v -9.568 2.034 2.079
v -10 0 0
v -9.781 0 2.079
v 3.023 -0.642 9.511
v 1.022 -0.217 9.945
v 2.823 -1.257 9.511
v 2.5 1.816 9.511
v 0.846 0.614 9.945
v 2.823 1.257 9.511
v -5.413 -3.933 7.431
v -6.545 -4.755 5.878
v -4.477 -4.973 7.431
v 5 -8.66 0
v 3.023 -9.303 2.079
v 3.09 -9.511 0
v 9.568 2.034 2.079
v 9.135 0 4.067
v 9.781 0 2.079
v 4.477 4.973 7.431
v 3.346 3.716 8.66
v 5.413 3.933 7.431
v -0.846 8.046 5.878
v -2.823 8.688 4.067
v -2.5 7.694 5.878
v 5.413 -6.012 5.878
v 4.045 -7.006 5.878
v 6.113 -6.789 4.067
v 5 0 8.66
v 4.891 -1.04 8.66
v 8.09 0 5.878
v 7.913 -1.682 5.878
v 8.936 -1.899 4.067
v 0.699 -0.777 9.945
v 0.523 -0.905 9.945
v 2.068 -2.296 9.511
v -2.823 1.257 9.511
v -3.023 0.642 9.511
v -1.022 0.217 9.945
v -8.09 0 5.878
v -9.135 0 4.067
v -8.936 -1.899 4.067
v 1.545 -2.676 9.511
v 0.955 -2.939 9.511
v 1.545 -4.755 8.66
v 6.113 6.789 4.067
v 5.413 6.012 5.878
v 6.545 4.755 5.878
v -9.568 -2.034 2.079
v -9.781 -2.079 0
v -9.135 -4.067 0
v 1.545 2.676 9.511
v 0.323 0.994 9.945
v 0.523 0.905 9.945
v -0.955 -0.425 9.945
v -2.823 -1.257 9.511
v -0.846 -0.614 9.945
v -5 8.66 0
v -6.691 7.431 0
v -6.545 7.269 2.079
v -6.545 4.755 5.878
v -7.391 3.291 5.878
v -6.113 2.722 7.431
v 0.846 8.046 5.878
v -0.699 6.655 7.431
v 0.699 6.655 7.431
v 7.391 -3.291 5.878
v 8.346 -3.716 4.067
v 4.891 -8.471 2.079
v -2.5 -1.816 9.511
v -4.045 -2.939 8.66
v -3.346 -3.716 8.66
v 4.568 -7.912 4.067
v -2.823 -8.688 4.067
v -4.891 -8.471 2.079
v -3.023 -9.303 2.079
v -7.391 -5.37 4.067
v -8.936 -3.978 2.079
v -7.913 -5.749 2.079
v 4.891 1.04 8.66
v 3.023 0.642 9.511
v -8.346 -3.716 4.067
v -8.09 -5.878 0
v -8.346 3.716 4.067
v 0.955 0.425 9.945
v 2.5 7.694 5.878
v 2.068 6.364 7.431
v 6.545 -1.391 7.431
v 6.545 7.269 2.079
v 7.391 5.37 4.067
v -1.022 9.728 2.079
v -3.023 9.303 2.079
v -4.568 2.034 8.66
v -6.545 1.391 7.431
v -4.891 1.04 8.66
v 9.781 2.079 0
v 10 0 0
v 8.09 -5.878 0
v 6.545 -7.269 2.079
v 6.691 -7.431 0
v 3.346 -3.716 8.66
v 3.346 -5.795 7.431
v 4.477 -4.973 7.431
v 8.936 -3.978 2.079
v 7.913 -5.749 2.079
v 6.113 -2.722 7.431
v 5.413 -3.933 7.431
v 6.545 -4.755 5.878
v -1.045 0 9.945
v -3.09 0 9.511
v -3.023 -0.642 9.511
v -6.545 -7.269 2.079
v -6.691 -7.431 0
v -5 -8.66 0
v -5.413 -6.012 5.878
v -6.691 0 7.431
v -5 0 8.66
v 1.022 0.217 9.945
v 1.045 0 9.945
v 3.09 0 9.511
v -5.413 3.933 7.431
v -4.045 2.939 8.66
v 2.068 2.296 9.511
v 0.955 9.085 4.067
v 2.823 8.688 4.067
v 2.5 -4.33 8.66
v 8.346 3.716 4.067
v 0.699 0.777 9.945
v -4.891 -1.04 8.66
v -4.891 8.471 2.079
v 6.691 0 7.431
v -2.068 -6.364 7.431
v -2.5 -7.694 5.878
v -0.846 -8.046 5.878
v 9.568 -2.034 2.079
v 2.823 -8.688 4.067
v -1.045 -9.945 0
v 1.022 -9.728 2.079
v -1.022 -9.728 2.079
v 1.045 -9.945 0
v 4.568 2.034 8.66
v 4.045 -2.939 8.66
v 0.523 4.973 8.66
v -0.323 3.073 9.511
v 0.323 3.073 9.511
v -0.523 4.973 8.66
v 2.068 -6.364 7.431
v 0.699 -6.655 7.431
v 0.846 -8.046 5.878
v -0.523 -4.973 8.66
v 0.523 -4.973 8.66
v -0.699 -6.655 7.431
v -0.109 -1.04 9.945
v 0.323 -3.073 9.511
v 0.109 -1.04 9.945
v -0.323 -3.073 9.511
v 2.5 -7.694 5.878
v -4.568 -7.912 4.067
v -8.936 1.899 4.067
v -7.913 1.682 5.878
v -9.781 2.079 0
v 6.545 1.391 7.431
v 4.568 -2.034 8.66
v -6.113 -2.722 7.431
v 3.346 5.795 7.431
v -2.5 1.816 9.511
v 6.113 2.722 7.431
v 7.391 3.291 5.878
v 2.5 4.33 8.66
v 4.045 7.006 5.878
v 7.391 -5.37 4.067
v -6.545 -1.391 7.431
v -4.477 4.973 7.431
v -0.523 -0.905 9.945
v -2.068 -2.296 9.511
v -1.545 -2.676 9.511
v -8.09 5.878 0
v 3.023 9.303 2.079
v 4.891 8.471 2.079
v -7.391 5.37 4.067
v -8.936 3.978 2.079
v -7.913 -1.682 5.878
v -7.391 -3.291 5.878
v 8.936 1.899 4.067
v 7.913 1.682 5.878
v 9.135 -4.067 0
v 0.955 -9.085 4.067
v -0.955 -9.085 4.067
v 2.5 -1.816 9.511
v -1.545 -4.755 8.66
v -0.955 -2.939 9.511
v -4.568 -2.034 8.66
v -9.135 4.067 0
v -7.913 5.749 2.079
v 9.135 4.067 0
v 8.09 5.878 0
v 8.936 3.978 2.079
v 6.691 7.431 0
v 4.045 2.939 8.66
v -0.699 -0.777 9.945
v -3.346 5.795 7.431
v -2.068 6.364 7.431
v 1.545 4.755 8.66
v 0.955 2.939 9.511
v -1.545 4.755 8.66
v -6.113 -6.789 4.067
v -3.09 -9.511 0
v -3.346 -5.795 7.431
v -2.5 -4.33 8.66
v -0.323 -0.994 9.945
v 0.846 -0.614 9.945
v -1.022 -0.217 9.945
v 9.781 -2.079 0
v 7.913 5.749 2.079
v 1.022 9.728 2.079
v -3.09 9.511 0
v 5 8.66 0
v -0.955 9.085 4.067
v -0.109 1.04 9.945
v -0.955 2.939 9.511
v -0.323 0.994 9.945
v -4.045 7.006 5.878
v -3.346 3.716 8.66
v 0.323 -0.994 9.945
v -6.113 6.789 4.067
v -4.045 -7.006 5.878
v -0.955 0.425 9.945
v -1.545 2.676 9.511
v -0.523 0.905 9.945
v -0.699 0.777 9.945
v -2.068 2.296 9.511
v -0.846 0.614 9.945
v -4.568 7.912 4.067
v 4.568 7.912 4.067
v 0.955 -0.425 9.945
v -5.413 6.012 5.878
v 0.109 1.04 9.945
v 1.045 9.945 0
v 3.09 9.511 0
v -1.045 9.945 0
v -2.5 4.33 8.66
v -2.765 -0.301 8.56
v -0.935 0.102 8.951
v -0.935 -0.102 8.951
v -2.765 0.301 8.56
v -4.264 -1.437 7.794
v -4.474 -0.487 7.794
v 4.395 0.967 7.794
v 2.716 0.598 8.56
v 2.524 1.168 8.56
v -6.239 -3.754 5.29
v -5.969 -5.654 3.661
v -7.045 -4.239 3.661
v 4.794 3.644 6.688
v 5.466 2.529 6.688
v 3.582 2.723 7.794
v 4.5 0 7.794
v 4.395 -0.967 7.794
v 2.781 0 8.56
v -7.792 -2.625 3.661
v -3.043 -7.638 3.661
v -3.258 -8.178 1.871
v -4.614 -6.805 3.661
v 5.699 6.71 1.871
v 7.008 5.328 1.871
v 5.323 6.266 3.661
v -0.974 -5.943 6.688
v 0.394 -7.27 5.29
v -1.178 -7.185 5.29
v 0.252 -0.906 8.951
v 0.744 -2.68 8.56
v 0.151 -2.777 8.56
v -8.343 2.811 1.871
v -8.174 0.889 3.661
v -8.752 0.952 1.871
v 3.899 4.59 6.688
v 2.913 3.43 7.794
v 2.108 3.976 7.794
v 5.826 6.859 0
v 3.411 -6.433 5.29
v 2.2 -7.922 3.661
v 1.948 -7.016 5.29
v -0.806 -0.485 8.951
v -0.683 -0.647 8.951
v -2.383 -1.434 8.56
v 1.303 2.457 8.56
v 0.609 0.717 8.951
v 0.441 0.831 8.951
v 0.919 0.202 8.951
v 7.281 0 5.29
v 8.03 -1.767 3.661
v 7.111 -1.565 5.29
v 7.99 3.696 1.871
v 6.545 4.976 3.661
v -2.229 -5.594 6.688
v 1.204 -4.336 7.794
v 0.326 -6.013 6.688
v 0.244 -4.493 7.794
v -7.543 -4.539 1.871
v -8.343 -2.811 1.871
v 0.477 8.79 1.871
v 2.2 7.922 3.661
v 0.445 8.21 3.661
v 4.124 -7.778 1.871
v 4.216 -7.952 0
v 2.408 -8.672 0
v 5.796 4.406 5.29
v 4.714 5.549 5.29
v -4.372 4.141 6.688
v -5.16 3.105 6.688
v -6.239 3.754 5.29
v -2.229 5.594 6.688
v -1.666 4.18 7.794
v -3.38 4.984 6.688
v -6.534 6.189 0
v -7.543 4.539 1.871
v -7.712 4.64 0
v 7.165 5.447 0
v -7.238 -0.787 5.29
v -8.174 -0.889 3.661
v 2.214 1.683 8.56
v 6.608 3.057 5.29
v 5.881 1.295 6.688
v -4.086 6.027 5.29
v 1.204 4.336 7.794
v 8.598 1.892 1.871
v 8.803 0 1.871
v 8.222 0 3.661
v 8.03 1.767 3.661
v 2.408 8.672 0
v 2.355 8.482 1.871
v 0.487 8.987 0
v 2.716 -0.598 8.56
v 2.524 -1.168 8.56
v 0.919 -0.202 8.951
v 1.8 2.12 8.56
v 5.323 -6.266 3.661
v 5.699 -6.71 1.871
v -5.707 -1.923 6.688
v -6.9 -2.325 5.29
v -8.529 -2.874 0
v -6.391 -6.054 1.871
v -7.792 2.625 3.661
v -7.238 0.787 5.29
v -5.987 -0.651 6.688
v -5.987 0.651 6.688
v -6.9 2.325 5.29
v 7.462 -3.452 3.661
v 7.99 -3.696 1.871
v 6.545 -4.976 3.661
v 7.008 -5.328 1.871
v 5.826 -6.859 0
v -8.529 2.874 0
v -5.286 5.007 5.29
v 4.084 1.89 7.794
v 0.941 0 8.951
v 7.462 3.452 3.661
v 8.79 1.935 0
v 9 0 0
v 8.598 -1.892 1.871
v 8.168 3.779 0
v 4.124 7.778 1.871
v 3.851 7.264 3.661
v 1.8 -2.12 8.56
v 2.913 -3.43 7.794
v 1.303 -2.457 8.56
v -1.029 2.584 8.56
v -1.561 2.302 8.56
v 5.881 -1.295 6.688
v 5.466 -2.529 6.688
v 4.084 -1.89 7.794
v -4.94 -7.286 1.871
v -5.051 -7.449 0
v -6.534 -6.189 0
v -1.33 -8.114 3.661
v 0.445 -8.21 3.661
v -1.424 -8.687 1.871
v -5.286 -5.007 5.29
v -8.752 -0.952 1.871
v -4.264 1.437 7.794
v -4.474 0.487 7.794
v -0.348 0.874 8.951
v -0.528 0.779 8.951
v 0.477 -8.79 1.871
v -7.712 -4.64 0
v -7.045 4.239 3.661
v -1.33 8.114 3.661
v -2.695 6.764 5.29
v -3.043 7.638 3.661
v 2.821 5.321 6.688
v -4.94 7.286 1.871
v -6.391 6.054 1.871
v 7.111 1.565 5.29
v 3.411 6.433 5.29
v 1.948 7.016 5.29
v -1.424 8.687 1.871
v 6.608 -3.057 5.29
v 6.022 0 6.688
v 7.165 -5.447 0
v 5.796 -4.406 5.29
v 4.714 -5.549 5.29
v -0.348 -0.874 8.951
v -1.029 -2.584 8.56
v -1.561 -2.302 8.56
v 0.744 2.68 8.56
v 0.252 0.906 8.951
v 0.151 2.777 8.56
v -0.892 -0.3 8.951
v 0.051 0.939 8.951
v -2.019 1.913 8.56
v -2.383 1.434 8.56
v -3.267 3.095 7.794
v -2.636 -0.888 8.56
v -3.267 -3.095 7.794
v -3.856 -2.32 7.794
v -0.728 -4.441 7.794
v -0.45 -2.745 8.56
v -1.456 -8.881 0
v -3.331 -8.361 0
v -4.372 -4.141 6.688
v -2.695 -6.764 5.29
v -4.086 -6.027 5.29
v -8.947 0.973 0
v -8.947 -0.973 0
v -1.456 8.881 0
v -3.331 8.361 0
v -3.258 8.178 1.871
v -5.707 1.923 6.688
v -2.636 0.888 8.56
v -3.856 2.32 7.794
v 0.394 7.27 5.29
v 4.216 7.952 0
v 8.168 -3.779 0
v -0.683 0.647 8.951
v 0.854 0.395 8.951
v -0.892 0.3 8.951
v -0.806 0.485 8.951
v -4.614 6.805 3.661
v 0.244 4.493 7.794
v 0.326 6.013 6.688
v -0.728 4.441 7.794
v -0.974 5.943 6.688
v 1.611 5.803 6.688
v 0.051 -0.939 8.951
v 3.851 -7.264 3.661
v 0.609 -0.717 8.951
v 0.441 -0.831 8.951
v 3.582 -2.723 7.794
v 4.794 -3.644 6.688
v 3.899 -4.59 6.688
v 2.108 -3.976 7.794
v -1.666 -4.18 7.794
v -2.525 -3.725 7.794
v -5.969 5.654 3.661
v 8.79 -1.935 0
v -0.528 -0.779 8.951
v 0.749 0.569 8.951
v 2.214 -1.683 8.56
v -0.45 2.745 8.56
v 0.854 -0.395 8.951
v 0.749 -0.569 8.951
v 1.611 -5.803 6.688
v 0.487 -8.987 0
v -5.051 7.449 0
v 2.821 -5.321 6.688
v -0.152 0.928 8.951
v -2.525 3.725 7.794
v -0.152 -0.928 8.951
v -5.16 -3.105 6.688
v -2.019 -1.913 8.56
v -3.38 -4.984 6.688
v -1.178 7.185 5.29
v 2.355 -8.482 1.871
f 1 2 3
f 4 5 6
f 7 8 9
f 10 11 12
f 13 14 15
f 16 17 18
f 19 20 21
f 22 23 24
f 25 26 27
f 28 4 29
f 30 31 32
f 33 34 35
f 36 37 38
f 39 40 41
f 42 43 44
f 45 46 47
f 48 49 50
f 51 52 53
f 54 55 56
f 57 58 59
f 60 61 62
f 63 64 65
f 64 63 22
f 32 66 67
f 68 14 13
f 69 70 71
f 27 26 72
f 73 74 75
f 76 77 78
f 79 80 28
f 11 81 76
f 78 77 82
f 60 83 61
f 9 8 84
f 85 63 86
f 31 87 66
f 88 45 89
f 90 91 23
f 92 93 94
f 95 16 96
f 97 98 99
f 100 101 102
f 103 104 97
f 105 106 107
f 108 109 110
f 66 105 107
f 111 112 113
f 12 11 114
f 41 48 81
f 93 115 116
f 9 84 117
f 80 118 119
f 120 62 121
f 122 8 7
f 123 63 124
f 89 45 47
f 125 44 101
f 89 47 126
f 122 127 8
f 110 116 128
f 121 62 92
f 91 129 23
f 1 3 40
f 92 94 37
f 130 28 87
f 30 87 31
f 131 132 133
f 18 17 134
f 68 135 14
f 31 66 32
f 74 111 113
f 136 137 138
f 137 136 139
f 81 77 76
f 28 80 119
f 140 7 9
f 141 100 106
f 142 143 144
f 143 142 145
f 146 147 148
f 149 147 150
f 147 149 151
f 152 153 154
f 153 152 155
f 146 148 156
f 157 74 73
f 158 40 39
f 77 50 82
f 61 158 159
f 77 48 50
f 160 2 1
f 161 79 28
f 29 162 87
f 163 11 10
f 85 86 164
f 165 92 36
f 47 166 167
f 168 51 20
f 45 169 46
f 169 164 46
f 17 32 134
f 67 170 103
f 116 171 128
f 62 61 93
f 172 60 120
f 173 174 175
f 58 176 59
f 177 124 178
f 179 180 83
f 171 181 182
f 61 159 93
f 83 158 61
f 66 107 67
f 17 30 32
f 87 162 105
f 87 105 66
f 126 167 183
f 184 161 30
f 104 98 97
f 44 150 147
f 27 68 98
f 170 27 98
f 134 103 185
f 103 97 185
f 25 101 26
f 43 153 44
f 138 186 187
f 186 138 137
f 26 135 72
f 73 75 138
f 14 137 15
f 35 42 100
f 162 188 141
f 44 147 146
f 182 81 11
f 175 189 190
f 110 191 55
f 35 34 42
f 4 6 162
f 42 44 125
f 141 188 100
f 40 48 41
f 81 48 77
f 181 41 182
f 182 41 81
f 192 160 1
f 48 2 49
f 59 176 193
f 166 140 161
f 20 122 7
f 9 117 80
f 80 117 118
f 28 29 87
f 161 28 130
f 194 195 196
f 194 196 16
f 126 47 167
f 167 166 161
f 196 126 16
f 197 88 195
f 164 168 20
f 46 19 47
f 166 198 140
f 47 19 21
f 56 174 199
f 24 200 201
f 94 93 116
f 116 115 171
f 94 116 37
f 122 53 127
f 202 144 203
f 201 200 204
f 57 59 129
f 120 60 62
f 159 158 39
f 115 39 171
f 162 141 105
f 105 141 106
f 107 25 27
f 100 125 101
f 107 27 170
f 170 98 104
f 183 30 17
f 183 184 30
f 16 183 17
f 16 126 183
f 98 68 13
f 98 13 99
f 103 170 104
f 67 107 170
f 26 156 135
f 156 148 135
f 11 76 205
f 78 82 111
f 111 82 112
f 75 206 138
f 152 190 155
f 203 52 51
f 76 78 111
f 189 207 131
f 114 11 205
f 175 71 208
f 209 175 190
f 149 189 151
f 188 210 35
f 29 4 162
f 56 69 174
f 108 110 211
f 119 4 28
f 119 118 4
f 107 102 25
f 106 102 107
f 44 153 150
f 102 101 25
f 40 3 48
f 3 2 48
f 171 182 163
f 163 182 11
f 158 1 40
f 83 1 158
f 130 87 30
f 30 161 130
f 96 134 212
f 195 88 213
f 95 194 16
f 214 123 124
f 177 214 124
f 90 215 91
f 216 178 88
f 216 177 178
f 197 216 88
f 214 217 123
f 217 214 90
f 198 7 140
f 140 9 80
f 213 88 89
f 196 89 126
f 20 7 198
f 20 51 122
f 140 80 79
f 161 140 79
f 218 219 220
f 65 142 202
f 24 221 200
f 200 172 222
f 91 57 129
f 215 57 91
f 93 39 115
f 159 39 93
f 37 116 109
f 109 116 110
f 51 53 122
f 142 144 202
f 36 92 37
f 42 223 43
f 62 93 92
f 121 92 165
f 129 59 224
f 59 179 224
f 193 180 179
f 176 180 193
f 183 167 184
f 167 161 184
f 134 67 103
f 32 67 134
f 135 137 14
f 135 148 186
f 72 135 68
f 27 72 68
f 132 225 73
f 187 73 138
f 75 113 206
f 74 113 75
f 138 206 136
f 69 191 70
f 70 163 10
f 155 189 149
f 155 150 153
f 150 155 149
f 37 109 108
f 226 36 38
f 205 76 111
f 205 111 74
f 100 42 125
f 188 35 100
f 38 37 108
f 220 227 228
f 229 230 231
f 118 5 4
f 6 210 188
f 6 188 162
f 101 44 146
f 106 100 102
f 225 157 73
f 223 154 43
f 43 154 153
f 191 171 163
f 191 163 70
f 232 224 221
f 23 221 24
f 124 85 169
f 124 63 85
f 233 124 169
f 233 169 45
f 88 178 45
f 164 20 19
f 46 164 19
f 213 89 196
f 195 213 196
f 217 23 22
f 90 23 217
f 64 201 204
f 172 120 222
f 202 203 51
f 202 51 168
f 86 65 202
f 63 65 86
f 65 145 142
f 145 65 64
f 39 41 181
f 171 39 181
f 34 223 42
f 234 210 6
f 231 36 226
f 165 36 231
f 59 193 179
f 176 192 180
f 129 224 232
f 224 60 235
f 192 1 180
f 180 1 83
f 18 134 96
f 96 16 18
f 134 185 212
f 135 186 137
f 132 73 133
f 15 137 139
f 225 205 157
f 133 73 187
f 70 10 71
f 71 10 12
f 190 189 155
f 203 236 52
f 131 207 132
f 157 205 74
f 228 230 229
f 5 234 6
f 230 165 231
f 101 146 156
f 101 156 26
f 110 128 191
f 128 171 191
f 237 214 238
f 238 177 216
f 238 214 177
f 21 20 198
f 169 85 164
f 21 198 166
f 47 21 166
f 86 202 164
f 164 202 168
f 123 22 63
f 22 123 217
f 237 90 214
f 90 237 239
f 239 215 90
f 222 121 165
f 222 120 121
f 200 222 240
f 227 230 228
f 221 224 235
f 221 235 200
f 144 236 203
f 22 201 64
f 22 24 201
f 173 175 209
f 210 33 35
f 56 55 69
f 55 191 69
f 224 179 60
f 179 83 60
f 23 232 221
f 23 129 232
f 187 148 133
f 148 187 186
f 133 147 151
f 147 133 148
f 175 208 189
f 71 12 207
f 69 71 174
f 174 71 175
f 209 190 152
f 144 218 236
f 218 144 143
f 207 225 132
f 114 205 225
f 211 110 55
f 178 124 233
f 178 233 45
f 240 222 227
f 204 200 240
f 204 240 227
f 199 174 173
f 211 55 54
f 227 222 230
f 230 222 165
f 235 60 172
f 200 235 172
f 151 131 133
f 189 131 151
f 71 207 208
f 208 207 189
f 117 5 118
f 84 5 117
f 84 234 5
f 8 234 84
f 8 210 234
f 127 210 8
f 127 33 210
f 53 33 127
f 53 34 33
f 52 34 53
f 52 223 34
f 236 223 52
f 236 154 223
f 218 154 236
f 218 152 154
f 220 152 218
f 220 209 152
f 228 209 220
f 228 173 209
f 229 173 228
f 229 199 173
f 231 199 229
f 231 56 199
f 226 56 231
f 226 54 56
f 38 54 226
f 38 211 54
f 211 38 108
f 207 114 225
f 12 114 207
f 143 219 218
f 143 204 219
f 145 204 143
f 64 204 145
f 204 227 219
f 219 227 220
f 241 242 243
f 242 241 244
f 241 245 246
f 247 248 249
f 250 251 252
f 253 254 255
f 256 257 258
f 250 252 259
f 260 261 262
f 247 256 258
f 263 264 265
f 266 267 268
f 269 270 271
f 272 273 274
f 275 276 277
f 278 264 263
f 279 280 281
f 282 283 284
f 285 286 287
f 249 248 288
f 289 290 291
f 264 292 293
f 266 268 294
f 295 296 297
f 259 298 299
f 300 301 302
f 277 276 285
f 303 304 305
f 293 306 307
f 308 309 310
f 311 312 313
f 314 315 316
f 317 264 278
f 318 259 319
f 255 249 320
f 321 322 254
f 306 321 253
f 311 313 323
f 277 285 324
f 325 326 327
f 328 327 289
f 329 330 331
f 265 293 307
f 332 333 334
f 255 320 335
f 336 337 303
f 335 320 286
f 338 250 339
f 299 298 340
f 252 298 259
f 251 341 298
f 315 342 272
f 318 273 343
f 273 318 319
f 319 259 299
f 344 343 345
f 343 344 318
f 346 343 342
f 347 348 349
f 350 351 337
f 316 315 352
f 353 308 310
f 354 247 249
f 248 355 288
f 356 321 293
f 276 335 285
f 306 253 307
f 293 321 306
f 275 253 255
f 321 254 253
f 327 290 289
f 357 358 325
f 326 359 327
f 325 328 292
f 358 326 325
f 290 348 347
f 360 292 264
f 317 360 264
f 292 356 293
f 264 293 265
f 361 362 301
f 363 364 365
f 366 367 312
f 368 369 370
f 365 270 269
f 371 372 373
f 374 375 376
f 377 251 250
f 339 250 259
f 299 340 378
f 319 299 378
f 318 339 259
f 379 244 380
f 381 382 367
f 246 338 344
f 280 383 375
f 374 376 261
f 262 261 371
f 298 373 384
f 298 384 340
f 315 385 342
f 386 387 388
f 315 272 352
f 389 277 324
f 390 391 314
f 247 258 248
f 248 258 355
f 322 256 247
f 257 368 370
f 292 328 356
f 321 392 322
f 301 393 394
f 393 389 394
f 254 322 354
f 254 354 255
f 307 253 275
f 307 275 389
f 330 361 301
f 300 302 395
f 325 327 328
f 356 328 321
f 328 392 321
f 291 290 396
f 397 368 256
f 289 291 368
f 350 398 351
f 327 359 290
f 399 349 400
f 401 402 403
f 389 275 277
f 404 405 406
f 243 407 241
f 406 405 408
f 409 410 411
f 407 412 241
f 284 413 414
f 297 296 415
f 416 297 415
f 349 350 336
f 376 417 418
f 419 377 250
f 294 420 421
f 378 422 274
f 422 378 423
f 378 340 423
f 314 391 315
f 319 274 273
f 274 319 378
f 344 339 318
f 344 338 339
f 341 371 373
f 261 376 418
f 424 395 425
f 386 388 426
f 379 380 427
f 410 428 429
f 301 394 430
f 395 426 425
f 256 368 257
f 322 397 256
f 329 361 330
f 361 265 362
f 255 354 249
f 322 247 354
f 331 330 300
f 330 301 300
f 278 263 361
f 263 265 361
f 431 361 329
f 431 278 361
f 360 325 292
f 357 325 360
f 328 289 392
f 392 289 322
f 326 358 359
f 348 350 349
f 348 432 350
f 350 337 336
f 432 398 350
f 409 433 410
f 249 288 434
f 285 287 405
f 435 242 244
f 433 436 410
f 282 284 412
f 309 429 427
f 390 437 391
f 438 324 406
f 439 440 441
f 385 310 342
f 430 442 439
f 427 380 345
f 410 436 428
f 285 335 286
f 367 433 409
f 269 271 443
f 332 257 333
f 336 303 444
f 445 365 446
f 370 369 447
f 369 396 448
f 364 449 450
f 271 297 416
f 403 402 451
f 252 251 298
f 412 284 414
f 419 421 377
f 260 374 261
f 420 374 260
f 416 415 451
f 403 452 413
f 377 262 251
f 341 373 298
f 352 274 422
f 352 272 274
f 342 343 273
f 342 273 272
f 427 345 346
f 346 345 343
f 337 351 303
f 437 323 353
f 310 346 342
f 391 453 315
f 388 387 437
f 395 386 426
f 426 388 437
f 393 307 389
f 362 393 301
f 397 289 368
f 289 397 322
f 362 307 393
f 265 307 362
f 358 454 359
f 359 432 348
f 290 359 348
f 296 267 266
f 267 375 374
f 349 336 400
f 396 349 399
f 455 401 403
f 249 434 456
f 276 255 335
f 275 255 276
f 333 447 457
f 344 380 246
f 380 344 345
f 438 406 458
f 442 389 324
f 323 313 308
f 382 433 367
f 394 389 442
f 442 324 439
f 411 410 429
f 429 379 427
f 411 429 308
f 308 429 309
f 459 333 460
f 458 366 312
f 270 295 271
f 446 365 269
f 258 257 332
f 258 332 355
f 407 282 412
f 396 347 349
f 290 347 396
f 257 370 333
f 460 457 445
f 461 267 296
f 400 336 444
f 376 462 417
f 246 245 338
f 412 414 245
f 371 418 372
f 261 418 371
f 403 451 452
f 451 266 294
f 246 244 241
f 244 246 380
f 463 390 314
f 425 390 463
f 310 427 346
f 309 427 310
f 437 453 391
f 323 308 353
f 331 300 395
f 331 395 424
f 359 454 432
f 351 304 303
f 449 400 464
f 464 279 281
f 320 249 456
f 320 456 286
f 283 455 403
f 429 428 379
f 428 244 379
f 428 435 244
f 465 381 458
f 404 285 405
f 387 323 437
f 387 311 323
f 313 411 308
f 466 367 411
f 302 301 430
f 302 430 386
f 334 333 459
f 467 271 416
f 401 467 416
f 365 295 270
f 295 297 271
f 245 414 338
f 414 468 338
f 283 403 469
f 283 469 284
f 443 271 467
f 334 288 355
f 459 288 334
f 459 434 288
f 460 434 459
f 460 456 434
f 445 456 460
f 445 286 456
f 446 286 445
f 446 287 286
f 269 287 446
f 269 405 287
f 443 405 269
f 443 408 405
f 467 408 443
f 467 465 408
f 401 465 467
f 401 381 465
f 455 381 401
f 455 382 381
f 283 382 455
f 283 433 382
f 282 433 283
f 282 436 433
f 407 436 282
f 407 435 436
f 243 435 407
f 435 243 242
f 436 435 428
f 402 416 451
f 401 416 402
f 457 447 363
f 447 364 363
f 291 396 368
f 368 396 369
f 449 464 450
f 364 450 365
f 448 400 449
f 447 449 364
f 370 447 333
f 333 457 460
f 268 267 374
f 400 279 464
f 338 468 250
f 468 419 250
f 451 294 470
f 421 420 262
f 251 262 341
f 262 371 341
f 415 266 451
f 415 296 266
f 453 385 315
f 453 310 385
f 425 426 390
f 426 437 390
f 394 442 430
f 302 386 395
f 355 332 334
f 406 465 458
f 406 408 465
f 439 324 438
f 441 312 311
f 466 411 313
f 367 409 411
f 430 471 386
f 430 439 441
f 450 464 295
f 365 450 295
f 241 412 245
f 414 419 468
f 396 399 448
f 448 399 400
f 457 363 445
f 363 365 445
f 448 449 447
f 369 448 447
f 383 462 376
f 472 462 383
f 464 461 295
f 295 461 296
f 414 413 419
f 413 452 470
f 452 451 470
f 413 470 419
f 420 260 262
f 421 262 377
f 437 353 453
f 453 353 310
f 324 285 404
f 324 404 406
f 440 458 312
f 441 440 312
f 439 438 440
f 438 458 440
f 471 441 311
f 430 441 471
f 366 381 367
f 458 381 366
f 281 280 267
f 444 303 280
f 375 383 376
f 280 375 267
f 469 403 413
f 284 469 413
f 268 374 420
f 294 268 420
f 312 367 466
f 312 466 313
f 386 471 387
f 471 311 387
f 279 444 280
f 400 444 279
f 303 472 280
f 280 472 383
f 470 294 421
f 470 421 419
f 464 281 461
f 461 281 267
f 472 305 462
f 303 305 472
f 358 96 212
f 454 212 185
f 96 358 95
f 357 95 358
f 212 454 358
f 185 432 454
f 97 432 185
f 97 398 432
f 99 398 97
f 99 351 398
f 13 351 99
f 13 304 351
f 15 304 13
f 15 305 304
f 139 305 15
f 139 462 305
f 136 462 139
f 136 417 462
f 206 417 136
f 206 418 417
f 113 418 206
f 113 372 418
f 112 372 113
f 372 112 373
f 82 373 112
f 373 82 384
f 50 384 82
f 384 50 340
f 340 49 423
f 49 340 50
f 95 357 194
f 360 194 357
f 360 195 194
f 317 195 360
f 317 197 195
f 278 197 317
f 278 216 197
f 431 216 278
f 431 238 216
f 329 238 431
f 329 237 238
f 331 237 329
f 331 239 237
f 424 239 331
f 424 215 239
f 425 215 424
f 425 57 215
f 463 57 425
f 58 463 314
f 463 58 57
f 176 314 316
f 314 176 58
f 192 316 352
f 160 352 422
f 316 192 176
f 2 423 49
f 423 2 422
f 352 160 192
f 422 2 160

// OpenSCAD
difference() {
  difference() { sphere(10); sphere(9); }
  translate([0, 0, -50]) { cube(100, true); }
}
